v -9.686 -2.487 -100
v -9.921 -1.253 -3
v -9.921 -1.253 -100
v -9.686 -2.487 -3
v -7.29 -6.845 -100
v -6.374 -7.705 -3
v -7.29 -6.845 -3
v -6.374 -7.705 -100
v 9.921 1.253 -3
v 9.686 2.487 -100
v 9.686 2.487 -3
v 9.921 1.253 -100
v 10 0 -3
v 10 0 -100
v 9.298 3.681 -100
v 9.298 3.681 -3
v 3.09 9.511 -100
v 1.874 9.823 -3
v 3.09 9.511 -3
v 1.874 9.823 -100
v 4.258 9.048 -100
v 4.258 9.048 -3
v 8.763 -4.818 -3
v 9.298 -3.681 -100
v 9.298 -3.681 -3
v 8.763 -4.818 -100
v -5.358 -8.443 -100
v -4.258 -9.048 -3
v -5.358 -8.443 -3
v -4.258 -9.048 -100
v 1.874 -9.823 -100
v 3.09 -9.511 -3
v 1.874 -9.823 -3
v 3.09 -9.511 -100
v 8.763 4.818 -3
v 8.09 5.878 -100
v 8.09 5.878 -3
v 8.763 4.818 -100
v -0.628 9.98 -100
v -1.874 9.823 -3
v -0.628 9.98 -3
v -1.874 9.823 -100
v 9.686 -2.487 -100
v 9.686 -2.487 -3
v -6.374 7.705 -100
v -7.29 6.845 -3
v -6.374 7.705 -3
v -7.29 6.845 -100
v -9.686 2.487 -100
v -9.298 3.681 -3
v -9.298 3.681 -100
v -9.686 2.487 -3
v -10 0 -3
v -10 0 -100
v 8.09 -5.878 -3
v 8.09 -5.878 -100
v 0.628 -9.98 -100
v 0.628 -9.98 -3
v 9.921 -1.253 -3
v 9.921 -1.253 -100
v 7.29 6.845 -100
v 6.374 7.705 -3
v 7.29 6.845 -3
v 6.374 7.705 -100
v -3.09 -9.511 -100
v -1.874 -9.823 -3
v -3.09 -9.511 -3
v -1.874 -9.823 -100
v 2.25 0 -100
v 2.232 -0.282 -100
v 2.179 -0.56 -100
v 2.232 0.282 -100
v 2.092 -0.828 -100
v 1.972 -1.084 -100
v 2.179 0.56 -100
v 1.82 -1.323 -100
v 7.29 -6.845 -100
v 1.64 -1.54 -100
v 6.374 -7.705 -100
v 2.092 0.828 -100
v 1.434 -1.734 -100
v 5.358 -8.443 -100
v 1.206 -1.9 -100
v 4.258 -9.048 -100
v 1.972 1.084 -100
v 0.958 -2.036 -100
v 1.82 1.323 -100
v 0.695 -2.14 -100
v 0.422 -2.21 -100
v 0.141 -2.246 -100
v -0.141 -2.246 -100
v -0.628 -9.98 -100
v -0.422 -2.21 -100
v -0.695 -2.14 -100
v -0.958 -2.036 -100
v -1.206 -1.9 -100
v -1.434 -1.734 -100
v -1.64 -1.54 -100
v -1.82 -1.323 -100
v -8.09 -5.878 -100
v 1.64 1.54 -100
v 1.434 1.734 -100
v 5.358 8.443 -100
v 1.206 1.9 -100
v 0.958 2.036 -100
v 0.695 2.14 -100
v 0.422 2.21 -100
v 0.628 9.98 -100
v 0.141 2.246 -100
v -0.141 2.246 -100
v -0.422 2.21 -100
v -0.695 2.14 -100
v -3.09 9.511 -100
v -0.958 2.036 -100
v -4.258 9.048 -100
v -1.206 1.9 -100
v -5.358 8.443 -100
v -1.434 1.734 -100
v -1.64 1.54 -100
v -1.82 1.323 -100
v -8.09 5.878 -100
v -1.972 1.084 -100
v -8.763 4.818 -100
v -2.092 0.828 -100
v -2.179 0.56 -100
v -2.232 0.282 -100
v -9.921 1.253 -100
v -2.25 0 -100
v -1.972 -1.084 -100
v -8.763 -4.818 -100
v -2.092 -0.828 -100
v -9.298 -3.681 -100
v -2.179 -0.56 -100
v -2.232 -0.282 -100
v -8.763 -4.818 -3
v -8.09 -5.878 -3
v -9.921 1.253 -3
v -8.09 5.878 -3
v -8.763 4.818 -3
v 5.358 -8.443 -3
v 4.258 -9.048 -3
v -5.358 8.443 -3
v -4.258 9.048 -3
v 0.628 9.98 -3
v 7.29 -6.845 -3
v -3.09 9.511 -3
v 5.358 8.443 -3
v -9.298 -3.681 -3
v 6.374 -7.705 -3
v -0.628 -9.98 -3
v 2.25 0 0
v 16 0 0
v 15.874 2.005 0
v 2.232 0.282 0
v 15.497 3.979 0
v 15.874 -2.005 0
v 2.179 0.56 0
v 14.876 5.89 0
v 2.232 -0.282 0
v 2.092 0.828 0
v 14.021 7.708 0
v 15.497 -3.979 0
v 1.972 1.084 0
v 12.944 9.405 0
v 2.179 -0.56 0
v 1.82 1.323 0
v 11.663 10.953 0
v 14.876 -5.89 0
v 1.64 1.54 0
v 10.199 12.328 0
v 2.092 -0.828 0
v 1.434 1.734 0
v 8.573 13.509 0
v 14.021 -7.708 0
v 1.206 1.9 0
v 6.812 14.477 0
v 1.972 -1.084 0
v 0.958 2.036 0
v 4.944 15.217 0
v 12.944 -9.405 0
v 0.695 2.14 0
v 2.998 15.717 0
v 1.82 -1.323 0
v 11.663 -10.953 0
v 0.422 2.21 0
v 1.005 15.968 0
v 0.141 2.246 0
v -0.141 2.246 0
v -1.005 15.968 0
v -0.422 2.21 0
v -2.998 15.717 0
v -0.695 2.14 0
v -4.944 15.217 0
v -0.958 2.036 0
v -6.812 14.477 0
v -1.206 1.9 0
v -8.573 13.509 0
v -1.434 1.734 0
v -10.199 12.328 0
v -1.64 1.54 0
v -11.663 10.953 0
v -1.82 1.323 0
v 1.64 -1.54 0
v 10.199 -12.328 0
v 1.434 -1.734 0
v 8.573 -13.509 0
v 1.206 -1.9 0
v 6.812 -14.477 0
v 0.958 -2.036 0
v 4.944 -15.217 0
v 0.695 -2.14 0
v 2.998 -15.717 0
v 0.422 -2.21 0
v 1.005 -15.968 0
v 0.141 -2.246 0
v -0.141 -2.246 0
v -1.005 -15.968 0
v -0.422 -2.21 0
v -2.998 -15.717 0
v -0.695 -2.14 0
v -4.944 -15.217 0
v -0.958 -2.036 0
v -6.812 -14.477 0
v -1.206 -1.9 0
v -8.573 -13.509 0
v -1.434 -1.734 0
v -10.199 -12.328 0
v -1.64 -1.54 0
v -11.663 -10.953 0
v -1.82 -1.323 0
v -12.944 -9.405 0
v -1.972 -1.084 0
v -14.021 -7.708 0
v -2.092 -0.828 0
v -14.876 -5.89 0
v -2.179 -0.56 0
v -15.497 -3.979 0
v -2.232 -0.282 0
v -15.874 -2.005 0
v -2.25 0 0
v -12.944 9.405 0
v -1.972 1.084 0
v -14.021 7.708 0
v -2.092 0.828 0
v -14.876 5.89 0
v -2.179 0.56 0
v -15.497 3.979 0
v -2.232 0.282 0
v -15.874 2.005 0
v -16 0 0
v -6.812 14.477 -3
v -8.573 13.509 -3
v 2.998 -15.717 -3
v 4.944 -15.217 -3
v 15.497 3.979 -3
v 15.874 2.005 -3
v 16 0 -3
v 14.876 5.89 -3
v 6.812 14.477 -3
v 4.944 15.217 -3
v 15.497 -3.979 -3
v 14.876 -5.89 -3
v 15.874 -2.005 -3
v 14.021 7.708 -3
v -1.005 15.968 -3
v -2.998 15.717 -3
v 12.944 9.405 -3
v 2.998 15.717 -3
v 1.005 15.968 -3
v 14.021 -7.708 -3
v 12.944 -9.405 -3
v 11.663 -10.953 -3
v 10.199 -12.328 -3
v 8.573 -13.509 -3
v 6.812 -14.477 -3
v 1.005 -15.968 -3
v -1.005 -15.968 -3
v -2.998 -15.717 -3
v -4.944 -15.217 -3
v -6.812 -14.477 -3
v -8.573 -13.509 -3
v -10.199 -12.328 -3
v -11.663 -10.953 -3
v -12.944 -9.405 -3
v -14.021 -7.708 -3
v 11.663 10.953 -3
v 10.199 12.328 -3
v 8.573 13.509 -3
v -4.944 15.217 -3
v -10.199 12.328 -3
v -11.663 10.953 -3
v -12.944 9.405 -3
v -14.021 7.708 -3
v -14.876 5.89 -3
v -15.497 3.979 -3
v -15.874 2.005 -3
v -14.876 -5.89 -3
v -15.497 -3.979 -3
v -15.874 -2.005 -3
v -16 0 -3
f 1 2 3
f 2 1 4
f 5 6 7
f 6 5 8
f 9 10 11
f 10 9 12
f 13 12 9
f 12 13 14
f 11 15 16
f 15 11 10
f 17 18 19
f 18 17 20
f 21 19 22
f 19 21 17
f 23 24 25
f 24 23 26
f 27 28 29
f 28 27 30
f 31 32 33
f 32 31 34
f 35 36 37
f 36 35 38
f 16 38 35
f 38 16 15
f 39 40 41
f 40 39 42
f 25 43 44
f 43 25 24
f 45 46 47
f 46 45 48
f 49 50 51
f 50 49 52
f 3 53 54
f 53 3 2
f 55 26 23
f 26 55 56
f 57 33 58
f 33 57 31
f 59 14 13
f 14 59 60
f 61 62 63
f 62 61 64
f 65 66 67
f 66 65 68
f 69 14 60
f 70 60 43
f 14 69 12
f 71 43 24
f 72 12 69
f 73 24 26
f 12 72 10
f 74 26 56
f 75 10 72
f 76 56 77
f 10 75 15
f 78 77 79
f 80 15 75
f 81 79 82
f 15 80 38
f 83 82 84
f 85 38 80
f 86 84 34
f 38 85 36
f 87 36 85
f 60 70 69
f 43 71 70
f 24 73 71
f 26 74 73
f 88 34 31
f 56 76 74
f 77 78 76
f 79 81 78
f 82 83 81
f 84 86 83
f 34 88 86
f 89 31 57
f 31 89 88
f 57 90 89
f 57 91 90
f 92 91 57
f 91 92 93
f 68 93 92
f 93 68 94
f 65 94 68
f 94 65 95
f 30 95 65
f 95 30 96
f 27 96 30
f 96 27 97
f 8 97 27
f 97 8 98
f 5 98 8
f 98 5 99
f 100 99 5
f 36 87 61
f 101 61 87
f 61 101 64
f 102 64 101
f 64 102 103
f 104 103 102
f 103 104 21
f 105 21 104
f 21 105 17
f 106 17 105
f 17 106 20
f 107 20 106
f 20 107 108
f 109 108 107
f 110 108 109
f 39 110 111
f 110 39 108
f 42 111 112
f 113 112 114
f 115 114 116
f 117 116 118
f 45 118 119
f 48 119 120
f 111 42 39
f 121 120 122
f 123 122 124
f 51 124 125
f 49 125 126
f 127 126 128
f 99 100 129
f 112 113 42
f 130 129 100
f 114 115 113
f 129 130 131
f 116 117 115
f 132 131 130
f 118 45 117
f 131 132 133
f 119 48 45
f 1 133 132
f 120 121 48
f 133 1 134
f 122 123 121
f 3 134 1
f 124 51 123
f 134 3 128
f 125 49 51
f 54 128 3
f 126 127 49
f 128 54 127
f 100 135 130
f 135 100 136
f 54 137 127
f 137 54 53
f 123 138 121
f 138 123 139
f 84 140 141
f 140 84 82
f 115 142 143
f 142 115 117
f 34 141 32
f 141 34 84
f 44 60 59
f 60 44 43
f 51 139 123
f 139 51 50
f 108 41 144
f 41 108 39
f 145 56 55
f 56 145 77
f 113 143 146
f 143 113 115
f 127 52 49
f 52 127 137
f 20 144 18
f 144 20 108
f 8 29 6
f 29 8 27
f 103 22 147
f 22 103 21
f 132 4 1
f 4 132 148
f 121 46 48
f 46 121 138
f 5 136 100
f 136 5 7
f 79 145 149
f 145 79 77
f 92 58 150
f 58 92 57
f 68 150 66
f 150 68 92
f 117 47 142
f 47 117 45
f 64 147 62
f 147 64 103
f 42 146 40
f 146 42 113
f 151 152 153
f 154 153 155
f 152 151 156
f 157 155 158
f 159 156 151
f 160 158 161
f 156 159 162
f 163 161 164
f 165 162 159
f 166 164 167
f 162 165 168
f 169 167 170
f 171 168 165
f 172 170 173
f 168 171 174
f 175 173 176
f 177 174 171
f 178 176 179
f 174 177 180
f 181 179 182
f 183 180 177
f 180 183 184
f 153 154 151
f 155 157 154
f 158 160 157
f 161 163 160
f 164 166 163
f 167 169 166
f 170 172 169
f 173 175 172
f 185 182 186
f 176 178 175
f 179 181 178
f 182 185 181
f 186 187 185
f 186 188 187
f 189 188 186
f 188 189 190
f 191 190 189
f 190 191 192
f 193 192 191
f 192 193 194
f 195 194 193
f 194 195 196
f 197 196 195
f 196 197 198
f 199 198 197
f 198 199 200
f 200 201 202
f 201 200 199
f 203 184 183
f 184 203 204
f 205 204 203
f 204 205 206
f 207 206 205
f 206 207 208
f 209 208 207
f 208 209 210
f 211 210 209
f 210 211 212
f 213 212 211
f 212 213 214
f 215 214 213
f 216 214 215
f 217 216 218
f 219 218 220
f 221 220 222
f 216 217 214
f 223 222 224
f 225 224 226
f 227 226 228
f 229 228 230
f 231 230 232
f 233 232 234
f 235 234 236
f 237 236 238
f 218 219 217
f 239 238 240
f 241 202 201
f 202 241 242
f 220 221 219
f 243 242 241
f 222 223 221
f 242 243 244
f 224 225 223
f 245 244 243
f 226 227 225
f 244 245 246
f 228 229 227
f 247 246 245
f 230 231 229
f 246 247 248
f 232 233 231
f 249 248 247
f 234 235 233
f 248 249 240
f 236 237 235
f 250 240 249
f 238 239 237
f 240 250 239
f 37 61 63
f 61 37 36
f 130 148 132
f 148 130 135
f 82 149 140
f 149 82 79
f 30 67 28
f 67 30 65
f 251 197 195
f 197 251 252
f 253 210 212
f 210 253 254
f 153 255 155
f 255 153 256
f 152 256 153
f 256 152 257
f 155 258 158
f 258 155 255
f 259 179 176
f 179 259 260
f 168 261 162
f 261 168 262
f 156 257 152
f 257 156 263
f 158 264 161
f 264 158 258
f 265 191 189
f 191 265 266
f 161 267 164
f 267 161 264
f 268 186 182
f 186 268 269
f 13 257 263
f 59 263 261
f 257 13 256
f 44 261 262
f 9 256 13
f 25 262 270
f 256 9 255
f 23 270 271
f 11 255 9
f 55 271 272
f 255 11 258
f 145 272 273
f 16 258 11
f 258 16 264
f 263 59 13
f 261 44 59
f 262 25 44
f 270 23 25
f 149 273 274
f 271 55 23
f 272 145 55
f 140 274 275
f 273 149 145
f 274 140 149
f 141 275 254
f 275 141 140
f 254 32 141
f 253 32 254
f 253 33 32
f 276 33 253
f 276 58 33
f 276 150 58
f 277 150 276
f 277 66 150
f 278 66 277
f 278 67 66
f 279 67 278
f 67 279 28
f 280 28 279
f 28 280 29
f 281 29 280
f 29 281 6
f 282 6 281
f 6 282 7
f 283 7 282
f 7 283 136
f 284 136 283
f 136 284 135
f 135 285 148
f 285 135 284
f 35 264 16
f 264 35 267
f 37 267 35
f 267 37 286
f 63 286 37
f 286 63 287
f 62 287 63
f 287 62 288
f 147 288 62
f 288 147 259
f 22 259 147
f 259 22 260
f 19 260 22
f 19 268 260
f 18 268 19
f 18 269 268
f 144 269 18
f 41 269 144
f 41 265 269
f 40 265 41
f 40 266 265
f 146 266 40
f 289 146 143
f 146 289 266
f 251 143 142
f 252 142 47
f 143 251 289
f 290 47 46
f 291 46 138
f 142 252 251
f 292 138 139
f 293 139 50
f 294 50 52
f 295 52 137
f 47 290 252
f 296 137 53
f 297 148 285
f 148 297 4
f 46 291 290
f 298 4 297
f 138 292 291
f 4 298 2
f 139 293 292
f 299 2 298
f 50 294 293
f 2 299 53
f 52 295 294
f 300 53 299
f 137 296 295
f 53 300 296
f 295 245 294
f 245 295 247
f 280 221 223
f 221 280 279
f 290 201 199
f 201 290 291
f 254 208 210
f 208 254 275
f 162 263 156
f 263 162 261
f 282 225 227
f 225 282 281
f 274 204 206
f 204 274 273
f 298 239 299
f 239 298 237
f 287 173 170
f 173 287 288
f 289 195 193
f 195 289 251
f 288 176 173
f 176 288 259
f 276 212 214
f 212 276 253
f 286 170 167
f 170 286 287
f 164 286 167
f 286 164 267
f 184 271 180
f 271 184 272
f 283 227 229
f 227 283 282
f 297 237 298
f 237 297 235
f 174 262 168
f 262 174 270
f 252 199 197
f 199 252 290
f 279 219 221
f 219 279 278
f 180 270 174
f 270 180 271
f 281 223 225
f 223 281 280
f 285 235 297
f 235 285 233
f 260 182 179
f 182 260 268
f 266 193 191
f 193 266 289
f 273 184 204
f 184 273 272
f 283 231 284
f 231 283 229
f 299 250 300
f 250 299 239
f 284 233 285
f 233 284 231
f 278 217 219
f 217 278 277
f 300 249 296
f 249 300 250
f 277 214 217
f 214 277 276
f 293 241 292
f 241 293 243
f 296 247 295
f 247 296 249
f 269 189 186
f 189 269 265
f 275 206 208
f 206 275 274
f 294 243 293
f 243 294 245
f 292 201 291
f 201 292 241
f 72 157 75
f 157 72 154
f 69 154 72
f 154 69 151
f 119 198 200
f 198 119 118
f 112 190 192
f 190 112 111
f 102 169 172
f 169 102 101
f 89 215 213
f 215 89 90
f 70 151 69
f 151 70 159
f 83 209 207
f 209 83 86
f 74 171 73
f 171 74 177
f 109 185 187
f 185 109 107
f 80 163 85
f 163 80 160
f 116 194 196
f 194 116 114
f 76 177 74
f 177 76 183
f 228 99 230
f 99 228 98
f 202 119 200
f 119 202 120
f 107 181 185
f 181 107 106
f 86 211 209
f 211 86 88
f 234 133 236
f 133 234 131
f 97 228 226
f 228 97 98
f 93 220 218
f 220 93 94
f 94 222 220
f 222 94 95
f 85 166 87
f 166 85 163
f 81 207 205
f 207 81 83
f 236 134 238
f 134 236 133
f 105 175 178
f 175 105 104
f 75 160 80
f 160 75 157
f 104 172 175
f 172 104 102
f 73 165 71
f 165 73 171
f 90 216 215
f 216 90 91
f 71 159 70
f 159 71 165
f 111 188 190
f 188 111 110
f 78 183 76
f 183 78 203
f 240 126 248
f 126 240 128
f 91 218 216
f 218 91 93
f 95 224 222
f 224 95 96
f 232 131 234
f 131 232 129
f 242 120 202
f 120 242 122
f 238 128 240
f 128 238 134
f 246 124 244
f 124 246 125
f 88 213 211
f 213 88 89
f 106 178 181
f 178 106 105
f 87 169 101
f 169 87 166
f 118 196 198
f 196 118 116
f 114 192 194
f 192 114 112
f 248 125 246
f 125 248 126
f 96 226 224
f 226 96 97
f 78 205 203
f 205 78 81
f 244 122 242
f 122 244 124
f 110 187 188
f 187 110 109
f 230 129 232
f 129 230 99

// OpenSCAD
$fn = 50;


difference() {
	union() {
		translate(v = [0, 0, -100.0000000000]) {
			cylinder(h = 100, r = 10.0000000000);
		}
		translate(v = [0, 0, -3.0000000000]) {
			cylinder(h = 3, r = 16.0000000000);
		}
	}
	union() {
		#translate(v = [0, 0, -100]) {
			cylinder(h = 100, r = 2.2500000000);
		}
	}
}
